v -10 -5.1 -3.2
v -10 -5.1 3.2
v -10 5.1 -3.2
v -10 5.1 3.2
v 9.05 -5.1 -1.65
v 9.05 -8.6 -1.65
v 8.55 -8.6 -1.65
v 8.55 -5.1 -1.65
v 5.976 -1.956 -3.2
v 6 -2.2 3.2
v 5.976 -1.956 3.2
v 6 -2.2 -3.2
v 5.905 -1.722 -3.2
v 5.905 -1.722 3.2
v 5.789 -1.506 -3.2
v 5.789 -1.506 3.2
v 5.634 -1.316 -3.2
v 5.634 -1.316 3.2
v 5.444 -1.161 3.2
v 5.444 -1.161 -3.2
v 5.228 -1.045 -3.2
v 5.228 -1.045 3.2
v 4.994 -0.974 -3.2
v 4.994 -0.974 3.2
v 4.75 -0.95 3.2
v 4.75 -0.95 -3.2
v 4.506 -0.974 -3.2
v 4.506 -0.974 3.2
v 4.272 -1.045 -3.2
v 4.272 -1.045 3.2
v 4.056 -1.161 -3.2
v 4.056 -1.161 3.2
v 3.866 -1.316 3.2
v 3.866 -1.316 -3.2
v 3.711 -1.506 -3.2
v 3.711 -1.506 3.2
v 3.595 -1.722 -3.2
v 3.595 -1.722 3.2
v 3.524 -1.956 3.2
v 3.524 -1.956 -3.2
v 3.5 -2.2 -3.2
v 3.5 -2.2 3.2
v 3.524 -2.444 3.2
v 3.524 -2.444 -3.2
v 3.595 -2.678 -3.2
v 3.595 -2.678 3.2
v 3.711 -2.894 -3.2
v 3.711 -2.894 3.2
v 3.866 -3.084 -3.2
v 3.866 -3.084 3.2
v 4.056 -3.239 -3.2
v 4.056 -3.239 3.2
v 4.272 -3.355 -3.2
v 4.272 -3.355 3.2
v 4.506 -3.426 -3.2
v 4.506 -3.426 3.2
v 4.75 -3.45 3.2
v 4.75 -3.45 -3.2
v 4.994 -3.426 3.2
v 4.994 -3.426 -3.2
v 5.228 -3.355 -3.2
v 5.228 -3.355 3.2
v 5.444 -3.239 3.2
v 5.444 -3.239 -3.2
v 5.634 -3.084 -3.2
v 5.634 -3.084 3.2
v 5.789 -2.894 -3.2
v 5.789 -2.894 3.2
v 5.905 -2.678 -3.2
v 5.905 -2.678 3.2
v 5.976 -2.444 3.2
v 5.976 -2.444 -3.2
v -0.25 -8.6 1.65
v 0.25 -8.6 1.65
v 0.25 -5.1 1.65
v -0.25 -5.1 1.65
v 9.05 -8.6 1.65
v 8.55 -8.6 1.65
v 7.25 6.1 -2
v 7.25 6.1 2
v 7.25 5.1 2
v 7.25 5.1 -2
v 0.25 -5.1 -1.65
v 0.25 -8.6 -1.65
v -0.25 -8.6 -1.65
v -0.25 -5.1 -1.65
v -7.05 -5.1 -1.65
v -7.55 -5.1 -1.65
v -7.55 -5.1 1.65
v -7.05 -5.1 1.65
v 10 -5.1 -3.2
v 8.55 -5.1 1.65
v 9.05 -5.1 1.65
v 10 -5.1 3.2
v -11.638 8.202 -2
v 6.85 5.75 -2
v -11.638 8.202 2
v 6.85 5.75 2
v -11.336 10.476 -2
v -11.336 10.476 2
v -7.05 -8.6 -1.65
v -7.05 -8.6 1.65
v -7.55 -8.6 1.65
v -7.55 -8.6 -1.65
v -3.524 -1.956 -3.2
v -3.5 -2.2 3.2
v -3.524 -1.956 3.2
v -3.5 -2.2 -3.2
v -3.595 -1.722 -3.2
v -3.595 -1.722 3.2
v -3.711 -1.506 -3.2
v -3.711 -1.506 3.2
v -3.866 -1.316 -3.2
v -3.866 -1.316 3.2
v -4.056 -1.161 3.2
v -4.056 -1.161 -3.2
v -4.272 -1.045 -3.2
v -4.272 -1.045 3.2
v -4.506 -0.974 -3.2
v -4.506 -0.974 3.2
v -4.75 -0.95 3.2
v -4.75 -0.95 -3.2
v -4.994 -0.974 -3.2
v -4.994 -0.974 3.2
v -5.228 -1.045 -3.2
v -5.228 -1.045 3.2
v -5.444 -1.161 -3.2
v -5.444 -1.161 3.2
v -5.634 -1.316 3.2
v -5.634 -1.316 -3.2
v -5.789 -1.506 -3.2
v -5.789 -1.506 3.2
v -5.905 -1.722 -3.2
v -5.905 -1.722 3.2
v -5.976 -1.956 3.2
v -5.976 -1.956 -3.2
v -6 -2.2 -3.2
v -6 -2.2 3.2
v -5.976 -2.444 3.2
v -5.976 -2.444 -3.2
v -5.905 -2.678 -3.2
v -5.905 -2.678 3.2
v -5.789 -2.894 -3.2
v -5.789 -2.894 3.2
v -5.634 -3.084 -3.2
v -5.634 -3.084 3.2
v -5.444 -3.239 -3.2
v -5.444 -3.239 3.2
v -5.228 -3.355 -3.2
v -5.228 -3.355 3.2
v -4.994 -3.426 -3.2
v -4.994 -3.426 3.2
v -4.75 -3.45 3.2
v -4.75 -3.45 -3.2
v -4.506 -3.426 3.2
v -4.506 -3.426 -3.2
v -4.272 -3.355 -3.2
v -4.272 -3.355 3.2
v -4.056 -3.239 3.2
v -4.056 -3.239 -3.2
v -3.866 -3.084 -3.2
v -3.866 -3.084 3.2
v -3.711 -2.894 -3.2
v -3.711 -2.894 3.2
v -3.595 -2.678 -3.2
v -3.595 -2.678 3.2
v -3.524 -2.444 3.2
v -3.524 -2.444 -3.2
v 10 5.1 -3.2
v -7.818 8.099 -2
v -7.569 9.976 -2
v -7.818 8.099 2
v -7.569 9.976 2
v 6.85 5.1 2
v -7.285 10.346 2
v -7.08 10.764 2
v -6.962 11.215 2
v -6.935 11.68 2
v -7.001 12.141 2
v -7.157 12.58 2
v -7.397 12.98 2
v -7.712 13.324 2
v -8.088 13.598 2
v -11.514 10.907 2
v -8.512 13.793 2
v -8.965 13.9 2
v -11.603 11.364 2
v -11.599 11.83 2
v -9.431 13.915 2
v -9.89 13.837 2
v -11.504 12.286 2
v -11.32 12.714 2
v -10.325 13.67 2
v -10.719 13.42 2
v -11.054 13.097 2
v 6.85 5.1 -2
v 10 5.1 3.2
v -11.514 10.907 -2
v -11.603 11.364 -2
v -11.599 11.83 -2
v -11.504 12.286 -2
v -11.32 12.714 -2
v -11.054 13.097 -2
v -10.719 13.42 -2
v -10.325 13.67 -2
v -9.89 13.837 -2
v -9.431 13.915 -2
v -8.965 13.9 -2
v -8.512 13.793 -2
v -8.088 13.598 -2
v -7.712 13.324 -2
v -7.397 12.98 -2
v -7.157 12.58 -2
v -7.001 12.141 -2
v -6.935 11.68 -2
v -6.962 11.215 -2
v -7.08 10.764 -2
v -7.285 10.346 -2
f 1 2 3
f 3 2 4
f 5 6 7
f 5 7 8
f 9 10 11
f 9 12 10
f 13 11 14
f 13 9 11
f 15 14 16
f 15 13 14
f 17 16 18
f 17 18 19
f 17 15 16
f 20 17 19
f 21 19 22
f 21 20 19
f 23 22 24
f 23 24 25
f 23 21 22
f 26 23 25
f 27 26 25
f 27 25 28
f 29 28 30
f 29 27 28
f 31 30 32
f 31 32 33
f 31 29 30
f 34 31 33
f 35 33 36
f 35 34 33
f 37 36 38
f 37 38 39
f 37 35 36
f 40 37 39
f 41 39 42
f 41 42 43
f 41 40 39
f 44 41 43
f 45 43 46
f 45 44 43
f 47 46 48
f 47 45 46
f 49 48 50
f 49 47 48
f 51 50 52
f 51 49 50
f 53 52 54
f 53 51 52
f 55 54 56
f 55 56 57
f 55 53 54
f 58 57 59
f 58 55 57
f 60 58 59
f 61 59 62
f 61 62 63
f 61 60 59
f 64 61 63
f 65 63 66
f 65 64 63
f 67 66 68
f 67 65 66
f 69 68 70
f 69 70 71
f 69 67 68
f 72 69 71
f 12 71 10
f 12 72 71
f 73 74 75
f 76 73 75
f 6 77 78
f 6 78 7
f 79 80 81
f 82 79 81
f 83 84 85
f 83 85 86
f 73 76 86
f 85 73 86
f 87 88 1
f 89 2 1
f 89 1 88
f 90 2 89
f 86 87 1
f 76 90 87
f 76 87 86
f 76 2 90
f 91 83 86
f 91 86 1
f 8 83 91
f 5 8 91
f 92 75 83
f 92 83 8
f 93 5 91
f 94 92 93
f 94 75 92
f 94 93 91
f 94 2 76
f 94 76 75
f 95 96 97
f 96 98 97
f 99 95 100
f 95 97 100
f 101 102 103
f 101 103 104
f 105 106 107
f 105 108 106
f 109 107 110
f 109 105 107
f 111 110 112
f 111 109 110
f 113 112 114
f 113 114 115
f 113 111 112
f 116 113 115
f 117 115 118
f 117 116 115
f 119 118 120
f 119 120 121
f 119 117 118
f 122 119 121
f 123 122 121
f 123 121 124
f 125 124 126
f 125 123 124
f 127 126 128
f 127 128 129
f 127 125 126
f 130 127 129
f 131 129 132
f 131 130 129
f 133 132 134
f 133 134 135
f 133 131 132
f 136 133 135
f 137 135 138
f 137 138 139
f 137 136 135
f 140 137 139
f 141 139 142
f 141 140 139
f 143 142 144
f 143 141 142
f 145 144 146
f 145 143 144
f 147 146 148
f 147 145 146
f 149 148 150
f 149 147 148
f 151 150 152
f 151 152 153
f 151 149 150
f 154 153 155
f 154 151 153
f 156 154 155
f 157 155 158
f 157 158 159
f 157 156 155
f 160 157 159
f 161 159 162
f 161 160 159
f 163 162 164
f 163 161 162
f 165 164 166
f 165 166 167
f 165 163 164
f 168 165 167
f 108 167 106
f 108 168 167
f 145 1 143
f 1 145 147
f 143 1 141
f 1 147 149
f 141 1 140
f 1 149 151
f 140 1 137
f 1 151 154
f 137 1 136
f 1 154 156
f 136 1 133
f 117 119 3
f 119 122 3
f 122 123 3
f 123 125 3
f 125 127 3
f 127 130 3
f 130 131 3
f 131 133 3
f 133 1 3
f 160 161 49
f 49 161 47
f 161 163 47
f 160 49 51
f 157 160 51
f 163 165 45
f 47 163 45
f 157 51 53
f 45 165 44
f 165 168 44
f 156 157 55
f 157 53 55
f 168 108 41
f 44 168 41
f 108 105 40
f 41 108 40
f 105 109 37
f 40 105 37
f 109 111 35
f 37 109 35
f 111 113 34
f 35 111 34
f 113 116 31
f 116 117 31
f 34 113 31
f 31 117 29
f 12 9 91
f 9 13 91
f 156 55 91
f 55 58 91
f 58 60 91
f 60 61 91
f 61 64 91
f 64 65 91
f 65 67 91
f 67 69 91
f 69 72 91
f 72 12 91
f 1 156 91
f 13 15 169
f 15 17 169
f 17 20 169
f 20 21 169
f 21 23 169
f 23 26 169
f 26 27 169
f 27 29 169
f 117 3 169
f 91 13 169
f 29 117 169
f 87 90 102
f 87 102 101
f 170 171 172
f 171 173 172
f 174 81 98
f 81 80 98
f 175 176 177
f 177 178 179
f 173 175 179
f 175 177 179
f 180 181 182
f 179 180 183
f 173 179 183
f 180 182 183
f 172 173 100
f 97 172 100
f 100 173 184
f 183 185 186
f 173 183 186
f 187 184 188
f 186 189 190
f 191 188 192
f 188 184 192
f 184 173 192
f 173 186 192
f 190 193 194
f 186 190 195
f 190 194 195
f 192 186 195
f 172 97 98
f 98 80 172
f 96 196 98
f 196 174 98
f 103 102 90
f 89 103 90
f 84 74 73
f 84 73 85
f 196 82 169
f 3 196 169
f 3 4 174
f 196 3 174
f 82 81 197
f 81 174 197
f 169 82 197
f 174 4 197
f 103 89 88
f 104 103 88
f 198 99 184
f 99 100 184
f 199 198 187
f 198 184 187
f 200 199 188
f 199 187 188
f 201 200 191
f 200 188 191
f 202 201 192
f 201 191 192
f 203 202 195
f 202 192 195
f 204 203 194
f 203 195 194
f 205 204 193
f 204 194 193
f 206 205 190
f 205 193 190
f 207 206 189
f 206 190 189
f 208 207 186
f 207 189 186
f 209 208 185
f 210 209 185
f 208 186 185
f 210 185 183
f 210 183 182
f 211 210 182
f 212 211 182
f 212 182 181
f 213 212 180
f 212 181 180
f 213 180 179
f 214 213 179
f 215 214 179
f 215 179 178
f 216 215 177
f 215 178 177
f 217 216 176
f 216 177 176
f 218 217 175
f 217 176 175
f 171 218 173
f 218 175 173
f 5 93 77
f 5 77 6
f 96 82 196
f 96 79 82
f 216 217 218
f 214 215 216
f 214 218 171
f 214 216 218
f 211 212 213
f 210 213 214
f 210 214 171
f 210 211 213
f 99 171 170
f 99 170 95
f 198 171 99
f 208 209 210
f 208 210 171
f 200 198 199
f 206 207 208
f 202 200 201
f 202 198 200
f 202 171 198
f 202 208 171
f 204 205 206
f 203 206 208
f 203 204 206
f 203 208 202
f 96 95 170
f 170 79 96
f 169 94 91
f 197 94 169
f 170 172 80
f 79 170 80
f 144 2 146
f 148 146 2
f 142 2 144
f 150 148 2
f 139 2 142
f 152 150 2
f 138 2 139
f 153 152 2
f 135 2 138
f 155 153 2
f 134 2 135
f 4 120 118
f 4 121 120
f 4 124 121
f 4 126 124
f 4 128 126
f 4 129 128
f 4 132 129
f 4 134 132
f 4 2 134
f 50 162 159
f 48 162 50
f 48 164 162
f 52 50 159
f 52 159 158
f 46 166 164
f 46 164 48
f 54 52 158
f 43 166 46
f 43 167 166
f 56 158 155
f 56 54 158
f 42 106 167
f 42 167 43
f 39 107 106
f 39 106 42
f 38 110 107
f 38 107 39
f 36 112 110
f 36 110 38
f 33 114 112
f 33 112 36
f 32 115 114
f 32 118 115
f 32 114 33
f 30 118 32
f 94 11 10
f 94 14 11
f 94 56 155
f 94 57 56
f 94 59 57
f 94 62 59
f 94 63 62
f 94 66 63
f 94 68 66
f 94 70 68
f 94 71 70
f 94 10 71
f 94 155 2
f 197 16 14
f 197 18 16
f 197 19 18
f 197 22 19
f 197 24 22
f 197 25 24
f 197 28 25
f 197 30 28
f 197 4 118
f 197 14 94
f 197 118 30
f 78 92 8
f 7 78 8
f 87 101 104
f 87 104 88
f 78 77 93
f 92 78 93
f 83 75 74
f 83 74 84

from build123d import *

# Parameters (mm, degrees)
SKETCH1_W           = 20
SKETCH1_H           = 10.2
SKETCH1_R           = 1.25
BOSS_EXTRUDE1_DEPTH = 3.2
BOSS_EXTRUDE2_DEPTH = 2
SKETCH3_W           = 3.3
SKETCH3_H           = 3.5
BOSS_EXTRUDE3_DEPTH = 0.25
BOSS_EXTRUDE4_START = 8.8
SKETCH3_2_W         = 3.3
SKETCH3_2_H         = 3.5
BOSS_EXTRUDE4_DEPTH = 0.25
BOSS_EXTRUDE5_START = -7.3
SKETCH3_3_W         = 3.3
SKETCH3_3_H         = 3.5
BOSS_EXTRUDE5_DEPTH = 0.25


with BuildPart() as part:
    # Sketch1 → Boss-Extrude1 (new, symmetric)
    with BuildSketch(Plane.XY):
        Rectangle(SKETCH1_W, SKETCH1_H)
        with Locations((-4.75, -2.2)):
            Circle(SKETCH1_R, mode=Mode.SUBTRACT)
        with Locations((4.75, -2.2)):
            Circle(SKETCH1_R, mode=Mode.SUBTRACT)
    extrude(amount=BOSS_EXTRUDE1_DEPTH, both=True)

    # Sketch2 → Boss-Extrude2 (add, symmetric)
    with BuildSketch(Plane.XY):
        with BuildLine():
            Line((7.25, 5.1), (6.85, 5.1))
            Line((6.85, 5.1), (6.85, 5.749556363))
            Line((6.85, 5.749556363), (-11.637609905, 8.201949589))
            Line((-11.637609905, 8.201949589), (-11.335934652, 10.476158449))
            ThreePointArc((-11.335934652, 10.476158449), (-8.965116404, 13.9), (-7.56893257, 9.976463224))
            Line((-7.56893257, 9.976463224), (-7.818008326, 8.098780899))
            Line((-7.818008326, 8.098780899), (7.25, 6.1))
            Line((7.25, 6.1), (7.25, 5.1))
        make_face()
    extrude(amount=BOSS_EXTRUDE2_DEPTH, both=True)

    # Sketch3 → Boss-Extrude3 (add, symmetric)
    with BuildSketch(Plane(origin=(0, 0, 0), x_dir=(0, 0, -1), z_dir=(1, 0, 0))):
        with Locations((0, -6.85)):
            Rectangle(SKETCH3_W, SKETCH3_H)
    extrude(amount=BOSS_EXTRUDE3_DEPTH, both=True)

    # Sketch3<2> → Boss-Extrude4 (add, symmetric)
    with BuildSketch(Plane(origin=(0, 0, 0), x_dir=(0, 0, -1), z_dir=(1, 0, 0)).offset(BOSS_EXTRUDE4_START)):
        with Locations((0, -6.85)):
            Rectangle(SKETCH3_2_W, SKETCH3_2_H)
    extrude(amount=BOSS_EXTRUDE4_DEPTH, both=True)

    # Sketch3<3> → Boss-Extrude5 (add, symmetric)
    with BuildSketch(Plane(origin=(0, 0, 0), x_dir=(0, 0, -1), z_dir=(1, 0, 0)).offset(BOSS_EXTRUDE5_START)):
        with Locations((0, -6.85)):
            Rectangle(SKETCH3_3_W, SKETCH3_3_H)
    extrude(amount=BOSS_EXTRUDE5_DEPTH, both=True)


solid = part.part
